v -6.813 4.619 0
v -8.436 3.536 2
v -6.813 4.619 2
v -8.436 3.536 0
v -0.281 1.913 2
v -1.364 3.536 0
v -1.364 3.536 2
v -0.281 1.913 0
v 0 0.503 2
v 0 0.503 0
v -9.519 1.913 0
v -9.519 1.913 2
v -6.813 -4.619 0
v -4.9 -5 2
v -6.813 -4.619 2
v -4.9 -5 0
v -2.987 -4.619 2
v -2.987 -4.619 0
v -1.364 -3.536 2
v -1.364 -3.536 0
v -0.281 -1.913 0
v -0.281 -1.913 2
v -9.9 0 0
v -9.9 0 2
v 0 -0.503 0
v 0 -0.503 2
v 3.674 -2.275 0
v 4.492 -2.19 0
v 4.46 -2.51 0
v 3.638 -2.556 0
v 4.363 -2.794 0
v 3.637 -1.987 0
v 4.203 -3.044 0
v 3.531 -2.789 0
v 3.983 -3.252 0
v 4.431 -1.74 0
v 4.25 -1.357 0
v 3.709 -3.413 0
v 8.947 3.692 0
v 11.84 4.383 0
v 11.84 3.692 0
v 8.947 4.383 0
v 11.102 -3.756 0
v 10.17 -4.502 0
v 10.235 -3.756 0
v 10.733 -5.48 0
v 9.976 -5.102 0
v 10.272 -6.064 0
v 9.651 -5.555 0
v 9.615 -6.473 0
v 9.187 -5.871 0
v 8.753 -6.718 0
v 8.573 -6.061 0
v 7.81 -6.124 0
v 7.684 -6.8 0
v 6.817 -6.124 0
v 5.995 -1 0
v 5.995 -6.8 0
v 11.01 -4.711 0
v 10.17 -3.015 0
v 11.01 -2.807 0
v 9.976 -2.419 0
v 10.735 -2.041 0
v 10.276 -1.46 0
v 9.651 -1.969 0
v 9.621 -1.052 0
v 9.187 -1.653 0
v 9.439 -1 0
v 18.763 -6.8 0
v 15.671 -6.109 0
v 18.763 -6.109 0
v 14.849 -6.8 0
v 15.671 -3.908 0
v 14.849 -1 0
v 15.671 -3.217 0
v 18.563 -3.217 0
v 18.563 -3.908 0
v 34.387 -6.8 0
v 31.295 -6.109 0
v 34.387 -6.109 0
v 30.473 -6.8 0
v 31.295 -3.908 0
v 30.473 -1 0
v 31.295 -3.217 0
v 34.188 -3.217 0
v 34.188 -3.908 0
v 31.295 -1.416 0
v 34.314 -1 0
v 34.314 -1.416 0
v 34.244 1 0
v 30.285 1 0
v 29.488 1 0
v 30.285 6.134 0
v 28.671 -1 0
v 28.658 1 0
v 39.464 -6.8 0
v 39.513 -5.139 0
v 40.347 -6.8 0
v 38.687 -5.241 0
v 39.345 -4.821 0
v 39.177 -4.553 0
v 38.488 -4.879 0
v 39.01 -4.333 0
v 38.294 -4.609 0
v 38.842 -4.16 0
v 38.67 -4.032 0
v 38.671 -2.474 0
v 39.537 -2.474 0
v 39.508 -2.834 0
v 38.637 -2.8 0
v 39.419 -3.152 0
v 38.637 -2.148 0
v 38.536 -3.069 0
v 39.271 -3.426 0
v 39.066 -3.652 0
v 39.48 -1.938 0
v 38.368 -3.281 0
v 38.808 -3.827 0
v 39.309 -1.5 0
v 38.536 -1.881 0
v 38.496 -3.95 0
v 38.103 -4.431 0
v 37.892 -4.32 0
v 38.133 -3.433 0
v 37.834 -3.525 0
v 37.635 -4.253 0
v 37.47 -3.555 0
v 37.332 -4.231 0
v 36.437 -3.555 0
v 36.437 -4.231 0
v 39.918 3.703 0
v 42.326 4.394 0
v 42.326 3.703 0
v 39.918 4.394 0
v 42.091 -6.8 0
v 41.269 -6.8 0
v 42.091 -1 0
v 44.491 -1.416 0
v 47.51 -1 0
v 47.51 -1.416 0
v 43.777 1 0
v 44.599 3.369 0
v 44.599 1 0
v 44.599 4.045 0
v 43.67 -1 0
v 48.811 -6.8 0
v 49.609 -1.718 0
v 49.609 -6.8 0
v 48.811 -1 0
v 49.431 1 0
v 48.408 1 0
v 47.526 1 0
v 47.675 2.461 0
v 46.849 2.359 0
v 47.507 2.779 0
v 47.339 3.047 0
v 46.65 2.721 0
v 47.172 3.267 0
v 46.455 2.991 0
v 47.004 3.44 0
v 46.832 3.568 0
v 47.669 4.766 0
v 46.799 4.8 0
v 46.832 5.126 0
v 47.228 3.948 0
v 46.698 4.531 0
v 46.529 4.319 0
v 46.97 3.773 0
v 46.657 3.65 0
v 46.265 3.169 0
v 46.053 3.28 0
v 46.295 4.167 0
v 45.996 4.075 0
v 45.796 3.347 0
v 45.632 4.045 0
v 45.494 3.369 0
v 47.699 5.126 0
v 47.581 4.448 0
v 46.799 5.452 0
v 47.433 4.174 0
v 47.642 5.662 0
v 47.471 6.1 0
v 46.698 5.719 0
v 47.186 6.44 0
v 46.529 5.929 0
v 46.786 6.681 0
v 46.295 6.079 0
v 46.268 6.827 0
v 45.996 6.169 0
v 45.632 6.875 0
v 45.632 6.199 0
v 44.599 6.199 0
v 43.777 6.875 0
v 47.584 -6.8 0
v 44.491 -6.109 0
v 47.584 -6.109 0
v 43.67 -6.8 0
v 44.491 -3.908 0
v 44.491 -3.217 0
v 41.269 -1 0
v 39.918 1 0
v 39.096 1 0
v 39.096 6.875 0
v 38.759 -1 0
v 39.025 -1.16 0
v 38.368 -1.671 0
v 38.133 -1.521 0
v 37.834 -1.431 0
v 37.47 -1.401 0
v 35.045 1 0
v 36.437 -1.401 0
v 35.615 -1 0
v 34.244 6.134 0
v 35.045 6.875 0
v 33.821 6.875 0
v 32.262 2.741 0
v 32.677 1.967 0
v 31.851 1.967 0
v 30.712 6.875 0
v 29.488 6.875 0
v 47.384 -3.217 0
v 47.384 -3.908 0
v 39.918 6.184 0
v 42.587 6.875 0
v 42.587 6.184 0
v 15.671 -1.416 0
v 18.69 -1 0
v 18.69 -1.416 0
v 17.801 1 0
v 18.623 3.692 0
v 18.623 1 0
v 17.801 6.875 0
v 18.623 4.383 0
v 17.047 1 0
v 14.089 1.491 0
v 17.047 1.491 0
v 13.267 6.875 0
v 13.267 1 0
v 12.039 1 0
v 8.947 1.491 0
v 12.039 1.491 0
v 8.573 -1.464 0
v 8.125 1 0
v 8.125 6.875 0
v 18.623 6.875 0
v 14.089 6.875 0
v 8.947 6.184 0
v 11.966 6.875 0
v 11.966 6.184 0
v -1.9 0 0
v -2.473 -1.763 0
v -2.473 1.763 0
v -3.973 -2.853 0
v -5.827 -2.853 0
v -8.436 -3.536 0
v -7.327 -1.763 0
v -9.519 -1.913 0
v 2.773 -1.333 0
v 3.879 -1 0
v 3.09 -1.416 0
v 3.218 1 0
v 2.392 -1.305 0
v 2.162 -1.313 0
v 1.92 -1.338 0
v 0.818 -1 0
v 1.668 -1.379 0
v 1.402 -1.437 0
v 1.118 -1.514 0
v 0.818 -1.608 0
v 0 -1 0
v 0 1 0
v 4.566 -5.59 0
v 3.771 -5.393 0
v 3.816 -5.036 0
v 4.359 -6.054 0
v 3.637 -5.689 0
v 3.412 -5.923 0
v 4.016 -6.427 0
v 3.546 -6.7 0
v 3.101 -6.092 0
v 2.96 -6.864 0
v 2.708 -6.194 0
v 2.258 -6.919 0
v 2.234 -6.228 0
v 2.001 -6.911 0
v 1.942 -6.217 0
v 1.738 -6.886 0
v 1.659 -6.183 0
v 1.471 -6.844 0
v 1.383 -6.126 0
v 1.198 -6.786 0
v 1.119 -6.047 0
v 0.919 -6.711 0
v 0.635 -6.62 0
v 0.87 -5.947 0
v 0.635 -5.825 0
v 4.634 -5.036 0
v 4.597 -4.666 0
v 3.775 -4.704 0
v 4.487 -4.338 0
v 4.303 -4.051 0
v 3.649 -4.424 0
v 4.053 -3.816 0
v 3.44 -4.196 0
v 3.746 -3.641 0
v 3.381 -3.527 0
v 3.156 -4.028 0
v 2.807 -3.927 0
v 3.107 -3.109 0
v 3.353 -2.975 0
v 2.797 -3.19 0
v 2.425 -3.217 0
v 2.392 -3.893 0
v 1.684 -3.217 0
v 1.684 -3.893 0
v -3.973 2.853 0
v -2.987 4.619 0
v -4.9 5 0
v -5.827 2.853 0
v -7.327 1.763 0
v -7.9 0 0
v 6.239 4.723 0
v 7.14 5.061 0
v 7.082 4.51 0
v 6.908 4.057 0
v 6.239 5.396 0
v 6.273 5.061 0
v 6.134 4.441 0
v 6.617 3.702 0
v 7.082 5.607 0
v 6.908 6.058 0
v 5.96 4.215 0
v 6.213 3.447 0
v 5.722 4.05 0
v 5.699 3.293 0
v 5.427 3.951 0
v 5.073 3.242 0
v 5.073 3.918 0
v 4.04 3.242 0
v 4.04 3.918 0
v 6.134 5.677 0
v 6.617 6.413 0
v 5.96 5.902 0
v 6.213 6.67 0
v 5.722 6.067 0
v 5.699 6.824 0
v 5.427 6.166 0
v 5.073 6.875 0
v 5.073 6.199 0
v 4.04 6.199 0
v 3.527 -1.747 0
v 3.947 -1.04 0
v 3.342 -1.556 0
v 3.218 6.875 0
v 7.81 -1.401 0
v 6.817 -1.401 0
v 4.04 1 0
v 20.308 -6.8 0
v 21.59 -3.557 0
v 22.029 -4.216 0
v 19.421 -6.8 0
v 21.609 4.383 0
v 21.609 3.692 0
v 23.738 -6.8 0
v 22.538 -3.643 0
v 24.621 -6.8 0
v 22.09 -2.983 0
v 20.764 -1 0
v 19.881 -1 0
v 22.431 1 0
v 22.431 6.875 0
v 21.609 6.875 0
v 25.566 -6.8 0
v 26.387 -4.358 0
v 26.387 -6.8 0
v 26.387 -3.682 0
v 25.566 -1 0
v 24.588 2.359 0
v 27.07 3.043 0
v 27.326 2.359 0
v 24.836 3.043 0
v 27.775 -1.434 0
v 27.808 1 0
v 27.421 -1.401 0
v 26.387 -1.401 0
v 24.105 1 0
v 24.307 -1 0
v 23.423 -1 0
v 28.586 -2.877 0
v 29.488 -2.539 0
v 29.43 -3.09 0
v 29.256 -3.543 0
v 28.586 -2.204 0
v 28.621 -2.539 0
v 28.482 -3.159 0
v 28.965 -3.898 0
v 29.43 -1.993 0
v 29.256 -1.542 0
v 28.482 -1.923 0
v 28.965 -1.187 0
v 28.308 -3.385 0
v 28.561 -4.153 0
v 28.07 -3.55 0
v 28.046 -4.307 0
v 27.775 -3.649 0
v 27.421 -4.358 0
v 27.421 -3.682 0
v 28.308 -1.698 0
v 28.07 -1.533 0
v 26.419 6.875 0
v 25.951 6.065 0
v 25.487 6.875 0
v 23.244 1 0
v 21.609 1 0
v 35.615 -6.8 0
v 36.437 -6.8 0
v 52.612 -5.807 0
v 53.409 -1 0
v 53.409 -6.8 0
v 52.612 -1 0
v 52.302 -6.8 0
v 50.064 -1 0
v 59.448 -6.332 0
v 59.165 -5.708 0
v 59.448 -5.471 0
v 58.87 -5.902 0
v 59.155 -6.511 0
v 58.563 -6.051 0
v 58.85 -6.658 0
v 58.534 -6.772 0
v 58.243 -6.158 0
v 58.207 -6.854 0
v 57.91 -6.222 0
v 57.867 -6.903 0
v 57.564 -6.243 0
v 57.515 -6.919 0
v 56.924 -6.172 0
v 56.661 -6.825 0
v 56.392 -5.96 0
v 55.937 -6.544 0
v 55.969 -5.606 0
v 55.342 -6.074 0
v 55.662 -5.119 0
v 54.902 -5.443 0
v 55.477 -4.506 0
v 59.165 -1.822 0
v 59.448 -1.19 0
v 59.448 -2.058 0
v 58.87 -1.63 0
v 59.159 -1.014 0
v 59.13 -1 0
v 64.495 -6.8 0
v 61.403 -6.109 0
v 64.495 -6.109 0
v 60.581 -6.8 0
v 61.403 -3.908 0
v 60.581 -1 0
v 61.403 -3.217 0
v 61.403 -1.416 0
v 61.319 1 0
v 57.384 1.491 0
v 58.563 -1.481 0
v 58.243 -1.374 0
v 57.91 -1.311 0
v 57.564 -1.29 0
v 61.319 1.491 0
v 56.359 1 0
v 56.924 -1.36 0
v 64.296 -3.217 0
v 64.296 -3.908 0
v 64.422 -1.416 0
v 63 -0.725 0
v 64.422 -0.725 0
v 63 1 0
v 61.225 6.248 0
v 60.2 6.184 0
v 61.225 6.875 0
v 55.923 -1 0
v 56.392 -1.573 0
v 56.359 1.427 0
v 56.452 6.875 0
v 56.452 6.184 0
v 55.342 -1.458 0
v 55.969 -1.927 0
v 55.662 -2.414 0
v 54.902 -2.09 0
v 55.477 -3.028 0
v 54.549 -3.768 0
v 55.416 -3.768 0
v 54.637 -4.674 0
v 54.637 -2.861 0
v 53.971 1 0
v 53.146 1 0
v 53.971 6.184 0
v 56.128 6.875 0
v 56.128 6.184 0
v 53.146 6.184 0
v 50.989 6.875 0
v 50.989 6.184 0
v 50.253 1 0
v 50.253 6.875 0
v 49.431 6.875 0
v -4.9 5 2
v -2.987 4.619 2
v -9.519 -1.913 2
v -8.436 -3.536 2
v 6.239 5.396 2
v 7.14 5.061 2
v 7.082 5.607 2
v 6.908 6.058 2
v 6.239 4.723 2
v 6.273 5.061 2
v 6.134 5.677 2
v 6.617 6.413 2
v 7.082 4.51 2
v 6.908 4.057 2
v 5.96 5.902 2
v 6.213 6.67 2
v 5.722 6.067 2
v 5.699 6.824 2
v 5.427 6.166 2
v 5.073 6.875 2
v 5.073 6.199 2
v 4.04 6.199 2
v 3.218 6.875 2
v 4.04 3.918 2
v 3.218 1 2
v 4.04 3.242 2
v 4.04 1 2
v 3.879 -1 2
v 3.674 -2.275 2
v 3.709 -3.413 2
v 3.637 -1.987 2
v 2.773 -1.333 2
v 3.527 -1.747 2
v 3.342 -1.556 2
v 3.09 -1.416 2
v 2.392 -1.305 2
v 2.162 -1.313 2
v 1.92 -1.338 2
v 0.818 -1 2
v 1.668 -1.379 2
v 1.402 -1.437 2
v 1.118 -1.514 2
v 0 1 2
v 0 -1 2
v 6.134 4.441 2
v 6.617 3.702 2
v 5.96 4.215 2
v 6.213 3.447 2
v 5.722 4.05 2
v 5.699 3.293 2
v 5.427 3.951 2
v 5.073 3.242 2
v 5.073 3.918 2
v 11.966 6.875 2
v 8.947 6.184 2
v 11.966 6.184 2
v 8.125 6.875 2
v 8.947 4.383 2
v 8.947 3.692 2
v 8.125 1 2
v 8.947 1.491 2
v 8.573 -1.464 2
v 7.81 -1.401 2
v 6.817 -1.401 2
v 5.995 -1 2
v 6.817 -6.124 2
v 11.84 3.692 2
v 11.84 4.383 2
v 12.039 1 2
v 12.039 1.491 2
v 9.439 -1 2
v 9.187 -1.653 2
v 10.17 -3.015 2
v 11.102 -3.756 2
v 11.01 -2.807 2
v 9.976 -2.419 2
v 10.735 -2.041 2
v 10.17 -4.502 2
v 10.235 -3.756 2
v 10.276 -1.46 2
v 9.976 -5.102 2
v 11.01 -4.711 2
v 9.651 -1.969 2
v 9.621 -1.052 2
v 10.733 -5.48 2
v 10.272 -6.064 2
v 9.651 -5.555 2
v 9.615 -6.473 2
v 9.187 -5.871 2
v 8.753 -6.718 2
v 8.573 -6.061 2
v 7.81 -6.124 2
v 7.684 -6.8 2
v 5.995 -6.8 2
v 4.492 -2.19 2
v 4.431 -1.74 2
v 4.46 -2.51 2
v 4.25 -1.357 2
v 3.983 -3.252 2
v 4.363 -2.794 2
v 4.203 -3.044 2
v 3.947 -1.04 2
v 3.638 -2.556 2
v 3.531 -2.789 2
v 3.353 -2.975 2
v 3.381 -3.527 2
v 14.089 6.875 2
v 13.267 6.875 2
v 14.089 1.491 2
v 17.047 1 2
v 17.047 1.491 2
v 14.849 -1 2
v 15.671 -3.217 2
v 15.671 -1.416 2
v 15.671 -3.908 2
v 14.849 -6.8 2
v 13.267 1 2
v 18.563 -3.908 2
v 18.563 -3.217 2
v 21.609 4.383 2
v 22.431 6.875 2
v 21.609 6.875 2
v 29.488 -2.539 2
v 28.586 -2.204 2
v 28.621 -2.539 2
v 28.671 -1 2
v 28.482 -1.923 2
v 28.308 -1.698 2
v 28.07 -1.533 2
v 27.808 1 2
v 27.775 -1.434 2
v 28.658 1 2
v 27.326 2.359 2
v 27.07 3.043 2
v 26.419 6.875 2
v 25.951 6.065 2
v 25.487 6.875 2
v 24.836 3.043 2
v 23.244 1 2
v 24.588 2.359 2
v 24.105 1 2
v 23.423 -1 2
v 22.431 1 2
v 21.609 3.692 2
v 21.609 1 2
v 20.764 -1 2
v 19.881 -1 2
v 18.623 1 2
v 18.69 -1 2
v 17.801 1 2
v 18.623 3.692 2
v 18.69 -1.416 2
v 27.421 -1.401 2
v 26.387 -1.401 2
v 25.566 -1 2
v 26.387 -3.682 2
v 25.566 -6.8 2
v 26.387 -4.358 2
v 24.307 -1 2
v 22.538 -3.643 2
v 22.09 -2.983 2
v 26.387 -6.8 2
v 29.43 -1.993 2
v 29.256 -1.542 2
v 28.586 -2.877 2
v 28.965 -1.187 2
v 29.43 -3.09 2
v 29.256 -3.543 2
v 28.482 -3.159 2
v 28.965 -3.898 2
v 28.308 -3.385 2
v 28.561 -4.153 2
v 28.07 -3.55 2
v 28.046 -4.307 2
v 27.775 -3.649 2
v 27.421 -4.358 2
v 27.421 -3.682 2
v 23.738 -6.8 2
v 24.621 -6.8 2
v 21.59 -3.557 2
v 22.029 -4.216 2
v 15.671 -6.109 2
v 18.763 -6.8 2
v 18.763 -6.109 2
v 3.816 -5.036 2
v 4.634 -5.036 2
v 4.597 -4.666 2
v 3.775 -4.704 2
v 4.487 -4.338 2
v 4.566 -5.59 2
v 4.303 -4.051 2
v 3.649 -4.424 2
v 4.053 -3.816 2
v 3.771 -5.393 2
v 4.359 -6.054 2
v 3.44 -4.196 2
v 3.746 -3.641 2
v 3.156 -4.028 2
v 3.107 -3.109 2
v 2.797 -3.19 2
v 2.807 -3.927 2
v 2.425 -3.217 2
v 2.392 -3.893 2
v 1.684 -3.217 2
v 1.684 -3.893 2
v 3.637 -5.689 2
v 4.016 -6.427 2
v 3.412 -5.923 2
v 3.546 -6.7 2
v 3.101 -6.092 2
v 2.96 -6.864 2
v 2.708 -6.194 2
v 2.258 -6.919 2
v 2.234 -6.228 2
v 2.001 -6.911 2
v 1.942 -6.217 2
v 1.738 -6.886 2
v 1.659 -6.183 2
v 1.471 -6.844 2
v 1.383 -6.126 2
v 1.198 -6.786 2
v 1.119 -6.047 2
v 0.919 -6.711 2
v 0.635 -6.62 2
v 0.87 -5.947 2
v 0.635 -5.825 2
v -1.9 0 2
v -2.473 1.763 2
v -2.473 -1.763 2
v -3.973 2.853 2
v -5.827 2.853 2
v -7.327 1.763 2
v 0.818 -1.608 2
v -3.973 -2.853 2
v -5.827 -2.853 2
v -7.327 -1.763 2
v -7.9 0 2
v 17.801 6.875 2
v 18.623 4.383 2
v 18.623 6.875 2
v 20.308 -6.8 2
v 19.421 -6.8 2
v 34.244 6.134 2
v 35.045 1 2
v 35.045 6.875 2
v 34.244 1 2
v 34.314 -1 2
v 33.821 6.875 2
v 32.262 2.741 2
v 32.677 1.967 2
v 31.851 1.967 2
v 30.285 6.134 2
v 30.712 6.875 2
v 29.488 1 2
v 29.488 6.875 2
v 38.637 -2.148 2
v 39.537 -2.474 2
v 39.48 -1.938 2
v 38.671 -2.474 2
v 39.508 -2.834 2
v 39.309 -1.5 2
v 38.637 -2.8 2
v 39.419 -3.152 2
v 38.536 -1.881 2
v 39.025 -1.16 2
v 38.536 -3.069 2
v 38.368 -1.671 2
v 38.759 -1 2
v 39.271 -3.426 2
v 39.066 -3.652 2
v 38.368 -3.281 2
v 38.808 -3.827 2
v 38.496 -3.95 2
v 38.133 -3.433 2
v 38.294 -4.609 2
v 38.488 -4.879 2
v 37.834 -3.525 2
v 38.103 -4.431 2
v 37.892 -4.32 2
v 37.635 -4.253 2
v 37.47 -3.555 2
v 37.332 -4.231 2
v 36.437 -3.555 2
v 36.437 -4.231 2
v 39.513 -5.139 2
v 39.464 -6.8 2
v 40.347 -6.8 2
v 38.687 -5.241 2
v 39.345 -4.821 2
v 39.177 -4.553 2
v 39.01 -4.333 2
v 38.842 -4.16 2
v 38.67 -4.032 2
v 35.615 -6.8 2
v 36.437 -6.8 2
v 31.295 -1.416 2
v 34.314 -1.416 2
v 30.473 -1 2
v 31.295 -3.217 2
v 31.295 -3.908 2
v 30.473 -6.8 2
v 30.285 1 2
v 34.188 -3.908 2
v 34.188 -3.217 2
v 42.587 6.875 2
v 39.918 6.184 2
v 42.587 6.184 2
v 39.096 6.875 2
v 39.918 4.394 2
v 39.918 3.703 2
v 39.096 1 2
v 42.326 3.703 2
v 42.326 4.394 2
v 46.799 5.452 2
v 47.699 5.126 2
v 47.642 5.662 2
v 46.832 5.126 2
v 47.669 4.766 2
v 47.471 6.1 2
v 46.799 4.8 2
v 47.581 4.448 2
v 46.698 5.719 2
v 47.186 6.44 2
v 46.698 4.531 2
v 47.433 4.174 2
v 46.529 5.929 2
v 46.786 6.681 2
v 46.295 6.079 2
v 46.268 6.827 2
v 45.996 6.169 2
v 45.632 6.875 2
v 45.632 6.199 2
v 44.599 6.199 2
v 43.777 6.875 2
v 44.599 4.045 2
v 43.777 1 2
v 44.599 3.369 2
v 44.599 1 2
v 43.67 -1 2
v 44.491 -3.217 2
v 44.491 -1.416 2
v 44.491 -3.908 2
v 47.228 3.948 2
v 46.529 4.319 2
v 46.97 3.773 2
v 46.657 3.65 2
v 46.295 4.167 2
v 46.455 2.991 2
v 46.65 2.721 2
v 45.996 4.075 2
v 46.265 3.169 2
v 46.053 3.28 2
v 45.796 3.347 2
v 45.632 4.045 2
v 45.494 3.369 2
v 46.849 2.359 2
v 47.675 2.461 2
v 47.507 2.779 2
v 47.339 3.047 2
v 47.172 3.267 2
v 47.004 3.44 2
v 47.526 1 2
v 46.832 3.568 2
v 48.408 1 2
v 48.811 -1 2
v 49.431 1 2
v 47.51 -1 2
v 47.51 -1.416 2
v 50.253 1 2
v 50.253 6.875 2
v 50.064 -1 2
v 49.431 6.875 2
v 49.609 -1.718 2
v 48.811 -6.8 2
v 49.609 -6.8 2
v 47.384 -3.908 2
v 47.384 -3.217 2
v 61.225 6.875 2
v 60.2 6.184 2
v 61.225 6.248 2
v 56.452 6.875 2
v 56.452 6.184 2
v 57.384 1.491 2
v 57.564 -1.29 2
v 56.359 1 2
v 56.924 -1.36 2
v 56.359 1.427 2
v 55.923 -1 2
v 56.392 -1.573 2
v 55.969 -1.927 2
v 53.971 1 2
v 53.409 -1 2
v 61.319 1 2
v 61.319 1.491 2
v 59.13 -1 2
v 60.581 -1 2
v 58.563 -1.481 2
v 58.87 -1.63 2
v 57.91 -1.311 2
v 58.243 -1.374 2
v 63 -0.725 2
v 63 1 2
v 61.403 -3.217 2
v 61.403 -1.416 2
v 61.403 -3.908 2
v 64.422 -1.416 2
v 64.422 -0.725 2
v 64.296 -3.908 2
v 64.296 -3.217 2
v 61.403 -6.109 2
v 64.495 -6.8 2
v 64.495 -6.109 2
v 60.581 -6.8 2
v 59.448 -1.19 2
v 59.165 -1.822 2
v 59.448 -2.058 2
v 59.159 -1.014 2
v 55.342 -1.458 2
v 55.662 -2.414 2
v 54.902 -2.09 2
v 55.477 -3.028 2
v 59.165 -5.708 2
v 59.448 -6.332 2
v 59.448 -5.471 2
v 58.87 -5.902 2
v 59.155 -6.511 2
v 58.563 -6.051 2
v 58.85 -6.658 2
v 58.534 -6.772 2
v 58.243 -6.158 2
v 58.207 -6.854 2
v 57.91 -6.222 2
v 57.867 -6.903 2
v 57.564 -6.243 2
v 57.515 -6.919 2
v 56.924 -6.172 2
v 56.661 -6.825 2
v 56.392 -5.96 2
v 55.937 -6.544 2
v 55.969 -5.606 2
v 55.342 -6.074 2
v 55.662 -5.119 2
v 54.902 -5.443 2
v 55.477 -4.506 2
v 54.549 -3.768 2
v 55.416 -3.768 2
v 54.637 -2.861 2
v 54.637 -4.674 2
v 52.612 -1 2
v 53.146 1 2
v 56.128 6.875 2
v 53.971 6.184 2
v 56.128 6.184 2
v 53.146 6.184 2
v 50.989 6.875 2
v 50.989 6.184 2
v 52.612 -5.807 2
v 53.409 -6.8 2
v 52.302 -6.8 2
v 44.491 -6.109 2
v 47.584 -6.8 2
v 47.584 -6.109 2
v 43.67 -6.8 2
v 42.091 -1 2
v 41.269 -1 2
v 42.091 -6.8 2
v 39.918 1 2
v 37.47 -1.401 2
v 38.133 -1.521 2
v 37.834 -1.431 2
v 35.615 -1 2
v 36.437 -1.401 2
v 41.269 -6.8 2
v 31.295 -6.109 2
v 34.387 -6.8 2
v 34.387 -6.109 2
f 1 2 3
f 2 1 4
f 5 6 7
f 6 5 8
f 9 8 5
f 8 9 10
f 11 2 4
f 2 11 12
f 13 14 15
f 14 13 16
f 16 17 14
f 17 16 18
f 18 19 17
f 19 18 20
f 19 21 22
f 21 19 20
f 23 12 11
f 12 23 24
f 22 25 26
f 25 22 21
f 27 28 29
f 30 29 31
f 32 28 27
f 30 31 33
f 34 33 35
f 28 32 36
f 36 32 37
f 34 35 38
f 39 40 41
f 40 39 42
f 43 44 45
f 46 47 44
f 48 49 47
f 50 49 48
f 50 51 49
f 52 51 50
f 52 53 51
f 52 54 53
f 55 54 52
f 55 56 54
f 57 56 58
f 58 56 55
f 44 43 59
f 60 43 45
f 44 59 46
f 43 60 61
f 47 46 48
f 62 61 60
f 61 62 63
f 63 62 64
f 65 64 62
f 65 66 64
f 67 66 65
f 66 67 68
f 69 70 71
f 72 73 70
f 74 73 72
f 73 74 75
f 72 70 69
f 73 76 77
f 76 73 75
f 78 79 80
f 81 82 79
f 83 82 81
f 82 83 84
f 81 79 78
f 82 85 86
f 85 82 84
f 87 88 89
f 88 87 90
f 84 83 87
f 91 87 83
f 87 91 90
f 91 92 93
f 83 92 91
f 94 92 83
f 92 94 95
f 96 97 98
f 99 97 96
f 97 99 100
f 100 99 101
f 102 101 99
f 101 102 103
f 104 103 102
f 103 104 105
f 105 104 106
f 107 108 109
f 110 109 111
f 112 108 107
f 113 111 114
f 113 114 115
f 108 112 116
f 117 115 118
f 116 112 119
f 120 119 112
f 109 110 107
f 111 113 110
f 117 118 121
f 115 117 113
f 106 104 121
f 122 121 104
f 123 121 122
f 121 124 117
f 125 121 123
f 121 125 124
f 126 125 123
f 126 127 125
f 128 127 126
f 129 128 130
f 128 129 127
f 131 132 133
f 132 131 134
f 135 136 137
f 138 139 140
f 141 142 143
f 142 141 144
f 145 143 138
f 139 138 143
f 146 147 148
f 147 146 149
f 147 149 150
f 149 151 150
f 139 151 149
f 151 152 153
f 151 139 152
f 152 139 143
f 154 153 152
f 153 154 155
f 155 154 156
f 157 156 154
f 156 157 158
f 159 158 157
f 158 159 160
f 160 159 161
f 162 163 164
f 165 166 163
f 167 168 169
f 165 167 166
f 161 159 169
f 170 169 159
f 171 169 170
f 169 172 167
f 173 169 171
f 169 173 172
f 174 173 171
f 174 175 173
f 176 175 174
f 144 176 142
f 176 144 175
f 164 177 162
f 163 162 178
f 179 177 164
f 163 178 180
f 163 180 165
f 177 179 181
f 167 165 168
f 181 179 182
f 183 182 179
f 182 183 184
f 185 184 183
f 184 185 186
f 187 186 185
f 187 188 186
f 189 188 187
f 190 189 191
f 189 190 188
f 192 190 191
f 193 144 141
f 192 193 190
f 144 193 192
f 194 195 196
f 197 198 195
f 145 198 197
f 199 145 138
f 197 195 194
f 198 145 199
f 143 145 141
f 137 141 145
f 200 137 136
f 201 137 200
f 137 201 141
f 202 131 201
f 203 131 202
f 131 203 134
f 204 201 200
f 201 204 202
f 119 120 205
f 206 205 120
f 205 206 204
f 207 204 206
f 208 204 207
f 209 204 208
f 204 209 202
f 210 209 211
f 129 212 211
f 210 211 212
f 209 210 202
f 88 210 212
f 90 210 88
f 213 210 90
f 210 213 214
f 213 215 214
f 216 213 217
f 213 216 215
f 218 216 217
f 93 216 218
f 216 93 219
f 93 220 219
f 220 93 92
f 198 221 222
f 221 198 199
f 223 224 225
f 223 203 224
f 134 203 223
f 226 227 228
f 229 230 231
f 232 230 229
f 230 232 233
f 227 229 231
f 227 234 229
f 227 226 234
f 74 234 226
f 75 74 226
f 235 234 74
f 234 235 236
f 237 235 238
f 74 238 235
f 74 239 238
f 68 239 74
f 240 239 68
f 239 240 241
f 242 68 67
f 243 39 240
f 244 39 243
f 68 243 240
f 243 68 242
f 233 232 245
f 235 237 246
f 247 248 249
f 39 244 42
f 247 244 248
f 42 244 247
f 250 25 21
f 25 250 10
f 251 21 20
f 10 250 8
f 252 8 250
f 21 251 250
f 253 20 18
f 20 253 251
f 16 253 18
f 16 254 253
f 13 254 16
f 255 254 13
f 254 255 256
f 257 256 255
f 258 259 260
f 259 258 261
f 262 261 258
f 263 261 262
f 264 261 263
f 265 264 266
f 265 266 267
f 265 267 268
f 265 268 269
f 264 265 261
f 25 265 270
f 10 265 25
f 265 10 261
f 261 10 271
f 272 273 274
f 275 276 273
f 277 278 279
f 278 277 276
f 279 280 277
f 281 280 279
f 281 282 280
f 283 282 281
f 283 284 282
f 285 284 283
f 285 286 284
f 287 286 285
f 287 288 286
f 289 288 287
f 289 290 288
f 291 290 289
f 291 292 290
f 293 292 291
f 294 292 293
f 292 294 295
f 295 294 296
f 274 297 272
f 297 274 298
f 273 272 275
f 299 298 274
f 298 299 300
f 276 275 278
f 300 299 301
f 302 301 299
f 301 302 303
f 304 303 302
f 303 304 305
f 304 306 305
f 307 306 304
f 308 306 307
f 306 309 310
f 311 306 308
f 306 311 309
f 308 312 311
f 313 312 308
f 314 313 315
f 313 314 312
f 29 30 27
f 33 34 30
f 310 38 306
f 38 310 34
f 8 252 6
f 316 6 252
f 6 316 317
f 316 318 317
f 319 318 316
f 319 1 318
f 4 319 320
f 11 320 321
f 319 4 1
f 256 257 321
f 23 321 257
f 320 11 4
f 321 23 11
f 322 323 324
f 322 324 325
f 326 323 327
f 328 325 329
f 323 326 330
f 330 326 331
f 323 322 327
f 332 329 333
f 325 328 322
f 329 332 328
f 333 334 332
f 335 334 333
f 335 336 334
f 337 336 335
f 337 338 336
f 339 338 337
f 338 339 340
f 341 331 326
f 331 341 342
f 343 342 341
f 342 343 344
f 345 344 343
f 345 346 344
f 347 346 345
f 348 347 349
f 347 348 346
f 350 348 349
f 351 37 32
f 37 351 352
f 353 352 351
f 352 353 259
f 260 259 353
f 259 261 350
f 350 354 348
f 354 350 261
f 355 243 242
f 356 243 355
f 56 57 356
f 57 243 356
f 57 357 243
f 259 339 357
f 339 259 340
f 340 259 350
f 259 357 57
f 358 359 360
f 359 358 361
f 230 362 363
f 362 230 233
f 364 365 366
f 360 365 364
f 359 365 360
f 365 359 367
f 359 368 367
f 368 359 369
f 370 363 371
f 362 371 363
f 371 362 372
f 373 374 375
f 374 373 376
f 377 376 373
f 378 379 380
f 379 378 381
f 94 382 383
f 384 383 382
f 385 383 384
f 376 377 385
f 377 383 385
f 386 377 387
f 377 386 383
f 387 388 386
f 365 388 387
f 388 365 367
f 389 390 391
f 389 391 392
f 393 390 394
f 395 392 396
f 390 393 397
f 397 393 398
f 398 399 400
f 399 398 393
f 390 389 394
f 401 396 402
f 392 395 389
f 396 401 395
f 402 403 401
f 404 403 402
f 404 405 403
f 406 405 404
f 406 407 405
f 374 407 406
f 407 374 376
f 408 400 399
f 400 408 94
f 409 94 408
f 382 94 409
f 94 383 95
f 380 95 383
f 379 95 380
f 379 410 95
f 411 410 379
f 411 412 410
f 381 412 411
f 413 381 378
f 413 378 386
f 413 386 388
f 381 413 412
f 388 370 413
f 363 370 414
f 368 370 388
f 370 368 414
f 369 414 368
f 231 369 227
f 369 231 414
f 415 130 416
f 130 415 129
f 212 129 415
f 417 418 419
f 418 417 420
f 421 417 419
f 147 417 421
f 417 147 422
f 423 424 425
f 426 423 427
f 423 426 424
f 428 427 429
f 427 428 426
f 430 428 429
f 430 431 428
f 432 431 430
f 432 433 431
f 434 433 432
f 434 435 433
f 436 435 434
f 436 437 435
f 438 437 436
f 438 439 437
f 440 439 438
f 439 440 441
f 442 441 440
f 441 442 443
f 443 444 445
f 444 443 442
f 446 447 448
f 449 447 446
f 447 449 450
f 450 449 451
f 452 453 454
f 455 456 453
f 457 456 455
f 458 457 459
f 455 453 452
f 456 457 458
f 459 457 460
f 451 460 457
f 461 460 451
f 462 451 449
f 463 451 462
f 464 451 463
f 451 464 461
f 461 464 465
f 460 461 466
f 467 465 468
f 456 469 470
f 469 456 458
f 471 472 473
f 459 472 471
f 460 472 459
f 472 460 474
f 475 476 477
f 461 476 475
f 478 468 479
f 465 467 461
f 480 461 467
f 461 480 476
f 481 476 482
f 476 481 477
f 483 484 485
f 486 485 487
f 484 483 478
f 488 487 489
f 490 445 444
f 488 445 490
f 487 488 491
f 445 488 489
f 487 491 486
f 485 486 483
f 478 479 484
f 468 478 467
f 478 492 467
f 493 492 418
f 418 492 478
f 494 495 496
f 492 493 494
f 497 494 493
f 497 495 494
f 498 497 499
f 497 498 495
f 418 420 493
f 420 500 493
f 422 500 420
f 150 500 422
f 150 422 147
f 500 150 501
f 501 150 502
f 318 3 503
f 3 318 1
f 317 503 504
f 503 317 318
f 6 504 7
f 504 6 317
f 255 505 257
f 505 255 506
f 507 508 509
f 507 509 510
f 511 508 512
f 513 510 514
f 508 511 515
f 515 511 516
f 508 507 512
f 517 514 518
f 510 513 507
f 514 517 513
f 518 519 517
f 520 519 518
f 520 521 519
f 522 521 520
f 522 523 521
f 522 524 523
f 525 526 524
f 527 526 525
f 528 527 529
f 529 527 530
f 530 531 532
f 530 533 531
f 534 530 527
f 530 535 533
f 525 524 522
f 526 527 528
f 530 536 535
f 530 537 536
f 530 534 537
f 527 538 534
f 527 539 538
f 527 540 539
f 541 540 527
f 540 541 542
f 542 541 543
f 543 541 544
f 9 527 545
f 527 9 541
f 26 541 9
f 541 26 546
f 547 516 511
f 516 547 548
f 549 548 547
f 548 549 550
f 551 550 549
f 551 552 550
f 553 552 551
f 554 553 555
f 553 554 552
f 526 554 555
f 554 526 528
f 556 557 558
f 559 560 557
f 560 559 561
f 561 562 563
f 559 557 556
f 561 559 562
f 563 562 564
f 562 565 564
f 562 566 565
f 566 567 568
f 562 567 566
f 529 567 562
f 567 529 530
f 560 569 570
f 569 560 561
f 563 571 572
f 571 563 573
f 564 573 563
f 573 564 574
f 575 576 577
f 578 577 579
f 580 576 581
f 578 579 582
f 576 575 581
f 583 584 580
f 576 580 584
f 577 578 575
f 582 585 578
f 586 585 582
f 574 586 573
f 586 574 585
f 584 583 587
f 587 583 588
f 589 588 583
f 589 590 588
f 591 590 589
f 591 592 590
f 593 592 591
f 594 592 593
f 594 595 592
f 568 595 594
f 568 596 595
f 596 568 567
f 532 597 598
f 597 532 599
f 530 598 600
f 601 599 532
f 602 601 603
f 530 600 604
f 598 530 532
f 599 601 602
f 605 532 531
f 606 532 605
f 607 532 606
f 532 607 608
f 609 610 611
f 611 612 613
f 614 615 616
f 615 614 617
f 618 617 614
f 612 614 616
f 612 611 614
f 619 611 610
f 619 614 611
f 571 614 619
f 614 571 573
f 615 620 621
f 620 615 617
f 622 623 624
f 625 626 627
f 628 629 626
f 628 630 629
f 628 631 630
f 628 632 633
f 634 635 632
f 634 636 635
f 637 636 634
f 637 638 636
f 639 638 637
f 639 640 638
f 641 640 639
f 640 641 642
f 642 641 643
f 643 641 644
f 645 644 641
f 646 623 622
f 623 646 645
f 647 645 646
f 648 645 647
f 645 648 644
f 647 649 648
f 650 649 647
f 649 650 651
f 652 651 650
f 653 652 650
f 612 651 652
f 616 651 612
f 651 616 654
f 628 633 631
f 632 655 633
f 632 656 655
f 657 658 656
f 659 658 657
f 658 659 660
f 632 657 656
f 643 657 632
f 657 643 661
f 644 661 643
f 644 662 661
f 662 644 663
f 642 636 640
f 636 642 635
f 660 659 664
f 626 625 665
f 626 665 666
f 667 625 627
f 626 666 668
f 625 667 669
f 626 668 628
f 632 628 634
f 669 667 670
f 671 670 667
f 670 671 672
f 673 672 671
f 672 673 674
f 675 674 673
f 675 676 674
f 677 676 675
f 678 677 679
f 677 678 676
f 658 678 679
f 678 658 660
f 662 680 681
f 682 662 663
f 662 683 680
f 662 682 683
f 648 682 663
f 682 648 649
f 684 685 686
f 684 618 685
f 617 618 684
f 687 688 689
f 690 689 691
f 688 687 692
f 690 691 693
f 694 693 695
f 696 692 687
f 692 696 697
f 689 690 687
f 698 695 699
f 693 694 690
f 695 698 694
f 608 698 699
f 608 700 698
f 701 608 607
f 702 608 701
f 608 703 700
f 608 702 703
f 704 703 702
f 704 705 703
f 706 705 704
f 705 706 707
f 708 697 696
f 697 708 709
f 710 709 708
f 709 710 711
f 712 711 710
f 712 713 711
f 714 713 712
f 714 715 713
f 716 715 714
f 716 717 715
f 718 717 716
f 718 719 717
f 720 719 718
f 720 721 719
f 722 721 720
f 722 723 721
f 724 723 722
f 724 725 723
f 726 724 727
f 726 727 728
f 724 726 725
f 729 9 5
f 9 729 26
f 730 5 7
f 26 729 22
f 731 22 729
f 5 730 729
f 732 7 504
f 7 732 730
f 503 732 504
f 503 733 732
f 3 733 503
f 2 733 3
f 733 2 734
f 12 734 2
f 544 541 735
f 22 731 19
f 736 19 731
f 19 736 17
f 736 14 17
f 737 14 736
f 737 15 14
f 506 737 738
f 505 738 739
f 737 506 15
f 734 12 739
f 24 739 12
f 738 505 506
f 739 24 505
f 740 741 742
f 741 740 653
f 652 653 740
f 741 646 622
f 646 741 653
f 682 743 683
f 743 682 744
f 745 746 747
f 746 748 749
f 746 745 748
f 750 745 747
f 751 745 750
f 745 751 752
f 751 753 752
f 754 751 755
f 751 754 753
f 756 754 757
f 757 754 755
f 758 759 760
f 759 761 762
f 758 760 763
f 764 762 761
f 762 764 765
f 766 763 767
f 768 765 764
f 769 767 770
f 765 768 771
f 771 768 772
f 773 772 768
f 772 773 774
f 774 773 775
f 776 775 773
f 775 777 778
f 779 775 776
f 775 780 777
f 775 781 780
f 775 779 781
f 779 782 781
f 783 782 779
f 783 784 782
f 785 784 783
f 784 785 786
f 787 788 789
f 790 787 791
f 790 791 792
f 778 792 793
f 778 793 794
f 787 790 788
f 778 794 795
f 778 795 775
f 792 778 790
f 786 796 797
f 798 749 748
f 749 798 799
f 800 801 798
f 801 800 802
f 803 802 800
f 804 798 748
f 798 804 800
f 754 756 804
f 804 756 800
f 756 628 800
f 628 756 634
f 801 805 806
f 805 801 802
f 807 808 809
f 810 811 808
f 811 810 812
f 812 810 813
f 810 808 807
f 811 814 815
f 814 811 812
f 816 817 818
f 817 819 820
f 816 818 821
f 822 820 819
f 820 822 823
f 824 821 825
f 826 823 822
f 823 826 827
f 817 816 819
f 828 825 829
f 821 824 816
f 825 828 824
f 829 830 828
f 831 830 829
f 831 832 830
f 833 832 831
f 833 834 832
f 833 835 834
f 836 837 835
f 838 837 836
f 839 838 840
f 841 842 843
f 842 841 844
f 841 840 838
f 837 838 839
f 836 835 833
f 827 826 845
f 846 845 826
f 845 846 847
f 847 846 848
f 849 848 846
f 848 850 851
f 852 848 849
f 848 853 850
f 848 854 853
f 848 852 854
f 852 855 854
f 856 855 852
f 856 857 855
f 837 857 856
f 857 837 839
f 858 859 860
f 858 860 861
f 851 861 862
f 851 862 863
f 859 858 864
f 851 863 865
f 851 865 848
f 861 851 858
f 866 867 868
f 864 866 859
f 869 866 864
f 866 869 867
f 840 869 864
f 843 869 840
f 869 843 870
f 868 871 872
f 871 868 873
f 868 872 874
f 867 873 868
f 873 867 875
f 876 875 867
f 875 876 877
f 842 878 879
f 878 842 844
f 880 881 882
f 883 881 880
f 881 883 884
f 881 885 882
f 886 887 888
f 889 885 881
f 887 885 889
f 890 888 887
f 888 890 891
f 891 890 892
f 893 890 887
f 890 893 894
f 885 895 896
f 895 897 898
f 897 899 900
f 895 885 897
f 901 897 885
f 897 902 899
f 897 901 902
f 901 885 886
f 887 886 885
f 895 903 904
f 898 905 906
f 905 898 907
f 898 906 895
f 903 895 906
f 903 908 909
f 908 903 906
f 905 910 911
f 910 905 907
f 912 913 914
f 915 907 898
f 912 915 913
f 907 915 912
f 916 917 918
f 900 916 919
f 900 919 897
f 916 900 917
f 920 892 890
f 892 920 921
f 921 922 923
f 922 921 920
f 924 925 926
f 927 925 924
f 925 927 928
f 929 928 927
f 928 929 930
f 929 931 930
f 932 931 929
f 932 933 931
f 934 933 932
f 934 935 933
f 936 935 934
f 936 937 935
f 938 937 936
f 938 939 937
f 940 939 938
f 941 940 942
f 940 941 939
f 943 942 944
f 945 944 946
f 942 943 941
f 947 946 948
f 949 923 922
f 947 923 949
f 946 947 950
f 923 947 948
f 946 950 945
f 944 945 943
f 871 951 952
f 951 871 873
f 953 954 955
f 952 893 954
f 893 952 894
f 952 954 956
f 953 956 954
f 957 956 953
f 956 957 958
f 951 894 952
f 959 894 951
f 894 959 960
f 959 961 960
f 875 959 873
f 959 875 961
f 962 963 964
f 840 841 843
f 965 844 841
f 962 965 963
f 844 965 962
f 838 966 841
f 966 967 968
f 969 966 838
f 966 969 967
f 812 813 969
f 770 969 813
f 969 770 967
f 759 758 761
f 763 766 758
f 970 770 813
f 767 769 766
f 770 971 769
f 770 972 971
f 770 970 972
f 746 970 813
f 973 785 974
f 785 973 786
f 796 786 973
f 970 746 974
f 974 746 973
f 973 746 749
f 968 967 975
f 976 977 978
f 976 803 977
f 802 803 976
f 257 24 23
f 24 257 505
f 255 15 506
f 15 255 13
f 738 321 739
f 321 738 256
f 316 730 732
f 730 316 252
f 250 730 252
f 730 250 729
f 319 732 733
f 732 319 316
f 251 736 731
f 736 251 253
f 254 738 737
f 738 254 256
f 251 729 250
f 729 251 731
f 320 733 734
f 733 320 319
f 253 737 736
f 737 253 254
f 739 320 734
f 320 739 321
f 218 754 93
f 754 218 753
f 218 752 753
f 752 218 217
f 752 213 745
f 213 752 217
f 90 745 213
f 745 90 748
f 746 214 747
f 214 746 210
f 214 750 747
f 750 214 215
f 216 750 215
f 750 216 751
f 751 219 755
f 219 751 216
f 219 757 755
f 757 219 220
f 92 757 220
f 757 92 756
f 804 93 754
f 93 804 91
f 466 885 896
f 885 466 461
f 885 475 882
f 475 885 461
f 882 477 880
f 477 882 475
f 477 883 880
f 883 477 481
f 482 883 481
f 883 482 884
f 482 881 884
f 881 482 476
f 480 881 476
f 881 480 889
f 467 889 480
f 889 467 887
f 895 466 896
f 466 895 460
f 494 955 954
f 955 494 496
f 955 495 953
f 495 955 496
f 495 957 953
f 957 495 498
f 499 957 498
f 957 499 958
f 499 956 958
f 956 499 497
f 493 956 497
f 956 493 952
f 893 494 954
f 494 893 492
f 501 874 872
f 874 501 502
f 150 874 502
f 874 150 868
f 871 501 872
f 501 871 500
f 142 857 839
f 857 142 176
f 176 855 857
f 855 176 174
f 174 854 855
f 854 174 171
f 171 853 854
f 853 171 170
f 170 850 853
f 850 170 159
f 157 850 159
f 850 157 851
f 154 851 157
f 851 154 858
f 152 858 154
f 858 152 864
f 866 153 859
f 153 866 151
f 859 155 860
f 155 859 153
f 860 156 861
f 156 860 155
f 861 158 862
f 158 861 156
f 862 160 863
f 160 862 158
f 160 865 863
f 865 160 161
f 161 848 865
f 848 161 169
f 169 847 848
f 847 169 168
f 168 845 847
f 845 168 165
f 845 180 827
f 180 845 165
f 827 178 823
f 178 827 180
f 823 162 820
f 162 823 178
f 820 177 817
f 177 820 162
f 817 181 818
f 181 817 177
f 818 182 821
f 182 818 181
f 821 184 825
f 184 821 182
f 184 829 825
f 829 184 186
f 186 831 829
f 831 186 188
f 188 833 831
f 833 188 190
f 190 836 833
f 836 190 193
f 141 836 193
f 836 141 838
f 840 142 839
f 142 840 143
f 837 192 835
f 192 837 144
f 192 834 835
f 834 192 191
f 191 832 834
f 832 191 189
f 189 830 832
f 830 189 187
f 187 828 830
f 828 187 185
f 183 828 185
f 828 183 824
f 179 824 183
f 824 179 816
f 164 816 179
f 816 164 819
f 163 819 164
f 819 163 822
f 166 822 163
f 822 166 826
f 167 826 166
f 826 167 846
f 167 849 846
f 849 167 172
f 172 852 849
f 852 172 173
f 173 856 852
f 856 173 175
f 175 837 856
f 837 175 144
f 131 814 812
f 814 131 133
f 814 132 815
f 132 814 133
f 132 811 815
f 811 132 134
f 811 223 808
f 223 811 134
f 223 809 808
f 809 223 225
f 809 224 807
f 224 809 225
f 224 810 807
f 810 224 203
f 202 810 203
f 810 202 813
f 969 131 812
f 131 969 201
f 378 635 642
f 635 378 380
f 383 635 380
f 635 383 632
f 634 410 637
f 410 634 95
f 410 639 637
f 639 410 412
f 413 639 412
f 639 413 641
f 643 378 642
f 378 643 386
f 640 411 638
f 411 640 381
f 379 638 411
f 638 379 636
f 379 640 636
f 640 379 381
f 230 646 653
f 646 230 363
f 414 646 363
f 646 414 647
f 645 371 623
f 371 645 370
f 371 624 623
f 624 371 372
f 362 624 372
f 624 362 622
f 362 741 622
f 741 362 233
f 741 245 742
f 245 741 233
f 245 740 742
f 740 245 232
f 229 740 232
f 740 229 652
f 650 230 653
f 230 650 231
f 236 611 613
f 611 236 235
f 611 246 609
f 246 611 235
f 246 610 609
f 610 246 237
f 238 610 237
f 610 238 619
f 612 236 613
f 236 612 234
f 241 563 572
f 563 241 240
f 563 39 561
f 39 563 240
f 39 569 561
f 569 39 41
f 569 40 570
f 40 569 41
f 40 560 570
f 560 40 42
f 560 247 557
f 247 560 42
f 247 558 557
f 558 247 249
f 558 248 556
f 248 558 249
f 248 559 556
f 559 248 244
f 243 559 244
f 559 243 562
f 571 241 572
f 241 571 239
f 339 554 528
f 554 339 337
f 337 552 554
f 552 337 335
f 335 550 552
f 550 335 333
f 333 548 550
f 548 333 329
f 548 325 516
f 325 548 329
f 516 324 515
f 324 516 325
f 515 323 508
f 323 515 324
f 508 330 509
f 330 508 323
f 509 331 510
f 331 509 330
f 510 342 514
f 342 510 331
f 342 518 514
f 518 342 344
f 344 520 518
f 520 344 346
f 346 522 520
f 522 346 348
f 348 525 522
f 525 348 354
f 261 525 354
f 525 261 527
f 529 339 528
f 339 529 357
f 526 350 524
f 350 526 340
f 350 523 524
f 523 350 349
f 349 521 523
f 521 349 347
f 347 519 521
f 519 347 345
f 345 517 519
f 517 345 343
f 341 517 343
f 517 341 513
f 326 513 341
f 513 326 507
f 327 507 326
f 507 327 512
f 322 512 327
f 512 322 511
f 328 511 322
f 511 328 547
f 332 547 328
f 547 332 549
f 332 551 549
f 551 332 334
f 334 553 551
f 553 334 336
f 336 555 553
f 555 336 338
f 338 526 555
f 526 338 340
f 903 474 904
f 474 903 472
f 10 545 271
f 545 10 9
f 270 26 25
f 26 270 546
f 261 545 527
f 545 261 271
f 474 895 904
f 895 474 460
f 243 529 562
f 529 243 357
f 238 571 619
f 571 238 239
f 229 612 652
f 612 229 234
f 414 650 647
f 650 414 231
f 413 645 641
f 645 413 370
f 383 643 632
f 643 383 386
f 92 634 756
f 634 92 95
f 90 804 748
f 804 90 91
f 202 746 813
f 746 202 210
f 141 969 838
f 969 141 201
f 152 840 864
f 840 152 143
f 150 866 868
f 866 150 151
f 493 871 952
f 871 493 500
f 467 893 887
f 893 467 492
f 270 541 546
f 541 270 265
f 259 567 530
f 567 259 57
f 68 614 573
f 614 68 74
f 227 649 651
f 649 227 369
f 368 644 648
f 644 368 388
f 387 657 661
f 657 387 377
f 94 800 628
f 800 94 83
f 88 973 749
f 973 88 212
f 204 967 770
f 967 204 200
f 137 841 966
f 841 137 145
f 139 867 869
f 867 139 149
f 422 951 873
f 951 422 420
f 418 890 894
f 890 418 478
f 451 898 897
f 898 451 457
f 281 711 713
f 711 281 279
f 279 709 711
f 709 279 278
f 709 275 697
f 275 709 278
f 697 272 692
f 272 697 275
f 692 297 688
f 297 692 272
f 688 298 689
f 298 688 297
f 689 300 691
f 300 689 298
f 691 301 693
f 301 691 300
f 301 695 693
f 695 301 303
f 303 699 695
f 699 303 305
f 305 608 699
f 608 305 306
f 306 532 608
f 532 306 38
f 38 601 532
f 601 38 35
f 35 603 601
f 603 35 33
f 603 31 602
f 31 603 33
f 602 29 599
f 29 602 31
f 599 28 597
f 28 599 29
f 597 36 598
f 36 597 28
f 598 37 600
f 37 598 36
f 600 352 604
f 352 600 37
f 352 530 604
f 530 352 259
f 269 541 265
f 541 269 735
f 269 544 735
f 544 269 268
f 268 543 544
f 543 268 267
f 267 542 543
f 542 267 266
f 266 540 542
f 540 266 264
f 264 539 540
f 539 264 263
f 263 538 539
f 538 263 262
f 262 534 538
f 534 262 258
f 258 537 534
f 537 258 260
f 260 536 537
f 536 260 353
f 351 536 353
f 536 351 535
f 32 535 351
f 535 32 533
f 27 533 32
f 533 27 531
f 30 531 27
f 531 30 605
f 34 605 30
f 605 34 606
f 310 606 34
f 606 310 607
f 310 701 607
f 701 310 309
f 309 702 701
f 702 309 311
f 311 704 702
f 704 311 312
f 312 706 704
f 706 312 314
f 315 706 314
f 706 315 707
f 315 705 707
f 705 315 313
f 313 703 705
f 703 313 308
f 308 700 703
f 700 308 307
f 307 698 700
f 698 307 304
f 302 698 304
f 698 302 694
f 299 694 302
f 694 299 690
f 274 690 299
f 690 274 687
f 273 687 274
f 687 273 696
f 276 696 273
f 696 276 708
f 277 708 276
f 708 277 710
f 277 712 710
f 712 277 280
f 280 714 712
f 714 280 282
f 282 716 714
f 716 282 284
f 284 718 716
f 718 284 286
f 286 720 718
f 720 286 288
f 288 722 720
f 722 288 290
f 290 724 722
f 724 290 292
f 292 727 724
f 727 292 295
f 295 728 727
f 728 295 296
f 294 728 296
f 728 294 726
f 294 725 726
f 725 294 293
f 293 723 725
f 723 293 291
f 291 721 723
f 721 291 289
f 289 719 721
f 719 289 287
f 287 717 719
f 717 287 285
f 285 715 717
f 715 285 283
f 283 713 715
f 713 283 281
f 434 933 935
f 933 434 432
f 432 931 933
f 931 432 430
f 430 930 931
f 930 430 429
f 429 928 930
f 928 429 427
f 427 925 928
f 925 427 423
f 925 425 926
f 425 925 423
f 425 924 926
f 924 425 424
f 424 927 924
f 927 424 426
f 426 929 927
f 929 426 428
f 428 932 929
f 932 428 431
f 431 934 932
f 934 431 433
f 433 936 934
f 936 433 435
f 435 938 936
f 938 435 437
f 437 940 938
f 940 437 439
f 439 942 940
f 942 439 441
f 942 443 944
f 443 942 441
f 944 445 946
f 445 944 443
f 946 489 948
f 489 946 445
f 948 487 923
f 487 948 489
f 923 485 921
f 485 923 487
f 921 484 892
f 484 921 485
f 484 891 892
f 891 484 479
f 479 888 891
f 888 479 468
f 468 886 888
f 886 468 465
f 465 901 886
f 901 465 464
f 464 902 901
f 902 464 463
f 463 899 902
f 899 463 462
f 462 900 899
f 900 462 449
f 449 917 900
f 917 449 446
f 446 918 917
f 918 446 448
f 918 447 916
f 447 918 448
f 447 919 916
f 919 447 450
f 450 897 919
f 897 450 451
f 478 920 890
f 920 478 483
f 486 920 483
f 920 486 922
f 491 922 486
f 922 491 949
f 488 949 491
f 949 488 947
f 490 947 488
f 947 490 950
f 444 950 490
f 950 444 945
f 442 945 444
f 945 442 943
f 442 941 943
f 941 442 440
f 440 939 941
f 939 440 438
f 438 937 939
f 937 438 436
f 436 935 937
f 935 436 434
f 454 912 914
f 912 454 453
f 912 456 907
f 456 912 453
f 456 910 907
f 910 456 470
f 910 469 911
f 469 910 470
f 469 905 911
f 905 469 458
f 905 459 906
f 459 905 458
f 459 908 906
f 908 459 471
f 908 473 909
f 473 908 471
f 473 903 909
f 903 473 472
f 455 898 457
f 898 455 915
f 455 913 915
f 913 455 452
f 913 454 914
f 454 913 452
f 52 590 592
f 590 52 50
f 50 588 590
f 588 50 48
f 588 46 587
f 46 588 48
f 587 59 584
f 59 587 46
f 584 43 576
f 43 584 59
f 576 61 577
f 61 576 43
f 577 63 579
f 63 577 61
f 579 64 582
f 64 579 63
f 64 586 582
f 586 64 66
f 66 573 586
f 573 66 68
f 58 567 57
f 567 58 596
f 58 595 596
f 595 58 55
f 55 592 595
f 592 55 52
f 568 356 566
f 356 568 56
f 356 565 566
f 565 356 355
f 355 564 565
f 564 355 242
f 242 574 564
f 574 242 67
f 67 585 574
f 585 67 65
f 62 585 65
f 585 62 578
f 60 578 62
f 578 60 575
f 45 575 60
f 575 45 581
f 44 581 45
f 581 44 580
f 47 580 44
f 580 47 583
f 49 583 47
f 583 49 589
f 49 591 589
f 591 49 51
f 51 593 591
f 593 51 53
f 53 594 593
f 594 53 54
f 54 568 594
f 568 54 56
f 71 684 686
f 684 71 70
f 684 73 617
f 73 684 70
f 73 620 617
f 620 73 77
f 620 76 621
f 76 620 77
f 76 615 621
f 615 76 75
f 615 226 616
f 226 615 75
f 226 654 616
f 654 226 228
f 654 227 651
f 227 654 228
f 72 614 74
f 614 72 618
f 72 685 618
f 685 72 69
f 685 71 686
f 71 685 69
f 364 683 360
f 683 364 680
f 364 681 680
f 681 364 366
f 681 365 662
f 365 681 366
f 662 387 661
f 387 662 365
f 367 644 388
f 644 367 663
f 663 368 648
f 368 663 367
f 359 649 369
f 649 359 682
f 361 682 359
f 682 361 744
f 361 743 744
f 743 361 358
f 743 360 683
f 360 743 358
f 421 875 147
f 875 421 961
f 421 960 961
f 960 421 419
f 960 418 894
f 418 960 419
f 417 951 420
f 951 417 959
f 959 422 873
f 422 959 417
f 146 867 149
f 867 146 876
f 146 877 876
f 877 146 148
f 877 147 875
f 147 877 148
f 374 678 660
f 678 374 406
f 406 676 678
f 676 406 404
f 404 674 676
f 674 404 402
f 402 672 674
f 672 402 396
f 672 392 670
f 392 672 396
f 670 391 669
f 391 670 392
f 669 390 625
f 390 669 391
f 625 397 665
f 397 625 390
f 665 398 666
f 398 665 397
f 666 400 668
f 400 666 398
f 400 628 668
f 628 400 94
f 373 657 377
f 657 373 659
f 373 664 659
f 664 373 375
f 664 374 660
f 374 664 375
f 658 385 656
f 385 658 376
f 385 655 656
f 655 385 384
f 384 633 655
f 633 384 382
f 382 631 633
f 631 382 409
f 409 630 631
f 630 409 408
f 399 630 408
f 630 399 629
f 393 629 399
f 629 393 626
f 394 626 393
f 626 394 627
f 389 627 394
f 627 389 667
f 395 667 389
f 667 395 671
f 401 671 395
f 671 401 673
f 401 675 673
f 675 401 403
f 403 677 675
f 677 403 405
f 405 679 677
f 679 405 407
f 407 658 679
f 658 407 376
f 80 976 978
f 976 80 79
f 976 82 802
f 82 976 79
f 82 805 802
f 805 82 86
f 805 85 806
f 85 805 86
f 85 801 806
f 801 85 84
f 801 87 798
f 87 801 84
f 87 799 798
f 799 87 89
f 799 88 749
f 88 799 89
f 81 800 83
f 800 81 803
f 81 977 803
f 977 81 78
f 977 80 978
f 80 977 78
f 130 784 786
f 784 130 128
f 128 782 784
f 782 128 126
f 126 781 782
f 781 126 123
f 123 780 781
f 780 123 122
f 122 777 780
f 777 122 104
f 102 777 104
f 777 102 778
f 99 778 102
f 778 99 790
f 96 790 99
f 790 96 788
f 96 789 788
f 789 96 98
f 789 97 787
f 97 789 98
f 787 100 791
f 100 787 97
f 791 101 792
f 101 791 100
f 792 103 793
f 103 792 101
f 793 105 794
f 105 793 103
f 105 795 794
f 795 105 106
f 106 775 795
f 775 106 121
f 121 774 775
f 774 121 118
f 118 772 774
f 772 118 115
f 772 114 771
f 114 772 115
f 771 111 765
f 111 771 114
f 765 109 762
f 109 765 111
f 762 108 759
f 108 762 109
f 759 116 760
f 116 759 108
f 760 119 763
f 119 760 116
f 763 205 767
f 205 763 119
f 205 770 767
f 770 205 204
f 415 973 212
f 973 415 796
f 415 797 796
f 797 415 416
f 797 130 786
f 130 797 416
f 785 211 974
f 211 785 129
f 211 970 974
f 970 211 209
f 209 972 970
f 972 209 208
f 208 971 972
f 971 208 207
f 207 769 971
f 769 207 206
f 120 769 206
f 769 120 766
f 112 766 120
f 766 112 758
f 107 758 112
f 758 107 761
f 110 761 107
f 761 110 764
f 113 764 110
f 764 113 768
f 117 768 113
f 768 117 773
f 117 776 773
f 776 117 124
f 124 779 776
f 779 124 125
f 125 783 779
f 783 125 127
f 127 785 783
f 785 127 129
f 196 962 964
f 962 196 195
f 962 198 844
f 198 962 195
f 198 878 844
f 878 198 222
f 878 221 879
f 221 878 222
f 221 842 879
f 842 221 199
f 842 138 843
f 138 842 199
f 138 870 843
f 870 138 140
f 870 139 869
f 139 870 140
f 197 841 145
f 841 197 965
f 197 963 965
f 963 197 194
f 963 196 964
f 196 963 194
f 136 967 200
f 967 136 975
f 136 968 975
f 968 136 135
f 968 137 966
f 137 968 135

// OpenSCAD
font=6;

union(){
translate([font*.4, .8, 0])
linear_extrude(height = 2)
text("PELHAM FRITZ", font, "Lato Black", spacing=1);
translate([0,-1,0])
cube([font*10.5, 2, 2]);
translate([0, -font-.8, 0])
linear_extrude(height = 2)
text("3D EXPERIENCE", font, "Lato Black", spacing=1);

translate([-4.9,0,0])difference(){
cylinder(r=5, h=2);
translate([0,0,-.5])cylinder(r=3, h=3);
}
}
